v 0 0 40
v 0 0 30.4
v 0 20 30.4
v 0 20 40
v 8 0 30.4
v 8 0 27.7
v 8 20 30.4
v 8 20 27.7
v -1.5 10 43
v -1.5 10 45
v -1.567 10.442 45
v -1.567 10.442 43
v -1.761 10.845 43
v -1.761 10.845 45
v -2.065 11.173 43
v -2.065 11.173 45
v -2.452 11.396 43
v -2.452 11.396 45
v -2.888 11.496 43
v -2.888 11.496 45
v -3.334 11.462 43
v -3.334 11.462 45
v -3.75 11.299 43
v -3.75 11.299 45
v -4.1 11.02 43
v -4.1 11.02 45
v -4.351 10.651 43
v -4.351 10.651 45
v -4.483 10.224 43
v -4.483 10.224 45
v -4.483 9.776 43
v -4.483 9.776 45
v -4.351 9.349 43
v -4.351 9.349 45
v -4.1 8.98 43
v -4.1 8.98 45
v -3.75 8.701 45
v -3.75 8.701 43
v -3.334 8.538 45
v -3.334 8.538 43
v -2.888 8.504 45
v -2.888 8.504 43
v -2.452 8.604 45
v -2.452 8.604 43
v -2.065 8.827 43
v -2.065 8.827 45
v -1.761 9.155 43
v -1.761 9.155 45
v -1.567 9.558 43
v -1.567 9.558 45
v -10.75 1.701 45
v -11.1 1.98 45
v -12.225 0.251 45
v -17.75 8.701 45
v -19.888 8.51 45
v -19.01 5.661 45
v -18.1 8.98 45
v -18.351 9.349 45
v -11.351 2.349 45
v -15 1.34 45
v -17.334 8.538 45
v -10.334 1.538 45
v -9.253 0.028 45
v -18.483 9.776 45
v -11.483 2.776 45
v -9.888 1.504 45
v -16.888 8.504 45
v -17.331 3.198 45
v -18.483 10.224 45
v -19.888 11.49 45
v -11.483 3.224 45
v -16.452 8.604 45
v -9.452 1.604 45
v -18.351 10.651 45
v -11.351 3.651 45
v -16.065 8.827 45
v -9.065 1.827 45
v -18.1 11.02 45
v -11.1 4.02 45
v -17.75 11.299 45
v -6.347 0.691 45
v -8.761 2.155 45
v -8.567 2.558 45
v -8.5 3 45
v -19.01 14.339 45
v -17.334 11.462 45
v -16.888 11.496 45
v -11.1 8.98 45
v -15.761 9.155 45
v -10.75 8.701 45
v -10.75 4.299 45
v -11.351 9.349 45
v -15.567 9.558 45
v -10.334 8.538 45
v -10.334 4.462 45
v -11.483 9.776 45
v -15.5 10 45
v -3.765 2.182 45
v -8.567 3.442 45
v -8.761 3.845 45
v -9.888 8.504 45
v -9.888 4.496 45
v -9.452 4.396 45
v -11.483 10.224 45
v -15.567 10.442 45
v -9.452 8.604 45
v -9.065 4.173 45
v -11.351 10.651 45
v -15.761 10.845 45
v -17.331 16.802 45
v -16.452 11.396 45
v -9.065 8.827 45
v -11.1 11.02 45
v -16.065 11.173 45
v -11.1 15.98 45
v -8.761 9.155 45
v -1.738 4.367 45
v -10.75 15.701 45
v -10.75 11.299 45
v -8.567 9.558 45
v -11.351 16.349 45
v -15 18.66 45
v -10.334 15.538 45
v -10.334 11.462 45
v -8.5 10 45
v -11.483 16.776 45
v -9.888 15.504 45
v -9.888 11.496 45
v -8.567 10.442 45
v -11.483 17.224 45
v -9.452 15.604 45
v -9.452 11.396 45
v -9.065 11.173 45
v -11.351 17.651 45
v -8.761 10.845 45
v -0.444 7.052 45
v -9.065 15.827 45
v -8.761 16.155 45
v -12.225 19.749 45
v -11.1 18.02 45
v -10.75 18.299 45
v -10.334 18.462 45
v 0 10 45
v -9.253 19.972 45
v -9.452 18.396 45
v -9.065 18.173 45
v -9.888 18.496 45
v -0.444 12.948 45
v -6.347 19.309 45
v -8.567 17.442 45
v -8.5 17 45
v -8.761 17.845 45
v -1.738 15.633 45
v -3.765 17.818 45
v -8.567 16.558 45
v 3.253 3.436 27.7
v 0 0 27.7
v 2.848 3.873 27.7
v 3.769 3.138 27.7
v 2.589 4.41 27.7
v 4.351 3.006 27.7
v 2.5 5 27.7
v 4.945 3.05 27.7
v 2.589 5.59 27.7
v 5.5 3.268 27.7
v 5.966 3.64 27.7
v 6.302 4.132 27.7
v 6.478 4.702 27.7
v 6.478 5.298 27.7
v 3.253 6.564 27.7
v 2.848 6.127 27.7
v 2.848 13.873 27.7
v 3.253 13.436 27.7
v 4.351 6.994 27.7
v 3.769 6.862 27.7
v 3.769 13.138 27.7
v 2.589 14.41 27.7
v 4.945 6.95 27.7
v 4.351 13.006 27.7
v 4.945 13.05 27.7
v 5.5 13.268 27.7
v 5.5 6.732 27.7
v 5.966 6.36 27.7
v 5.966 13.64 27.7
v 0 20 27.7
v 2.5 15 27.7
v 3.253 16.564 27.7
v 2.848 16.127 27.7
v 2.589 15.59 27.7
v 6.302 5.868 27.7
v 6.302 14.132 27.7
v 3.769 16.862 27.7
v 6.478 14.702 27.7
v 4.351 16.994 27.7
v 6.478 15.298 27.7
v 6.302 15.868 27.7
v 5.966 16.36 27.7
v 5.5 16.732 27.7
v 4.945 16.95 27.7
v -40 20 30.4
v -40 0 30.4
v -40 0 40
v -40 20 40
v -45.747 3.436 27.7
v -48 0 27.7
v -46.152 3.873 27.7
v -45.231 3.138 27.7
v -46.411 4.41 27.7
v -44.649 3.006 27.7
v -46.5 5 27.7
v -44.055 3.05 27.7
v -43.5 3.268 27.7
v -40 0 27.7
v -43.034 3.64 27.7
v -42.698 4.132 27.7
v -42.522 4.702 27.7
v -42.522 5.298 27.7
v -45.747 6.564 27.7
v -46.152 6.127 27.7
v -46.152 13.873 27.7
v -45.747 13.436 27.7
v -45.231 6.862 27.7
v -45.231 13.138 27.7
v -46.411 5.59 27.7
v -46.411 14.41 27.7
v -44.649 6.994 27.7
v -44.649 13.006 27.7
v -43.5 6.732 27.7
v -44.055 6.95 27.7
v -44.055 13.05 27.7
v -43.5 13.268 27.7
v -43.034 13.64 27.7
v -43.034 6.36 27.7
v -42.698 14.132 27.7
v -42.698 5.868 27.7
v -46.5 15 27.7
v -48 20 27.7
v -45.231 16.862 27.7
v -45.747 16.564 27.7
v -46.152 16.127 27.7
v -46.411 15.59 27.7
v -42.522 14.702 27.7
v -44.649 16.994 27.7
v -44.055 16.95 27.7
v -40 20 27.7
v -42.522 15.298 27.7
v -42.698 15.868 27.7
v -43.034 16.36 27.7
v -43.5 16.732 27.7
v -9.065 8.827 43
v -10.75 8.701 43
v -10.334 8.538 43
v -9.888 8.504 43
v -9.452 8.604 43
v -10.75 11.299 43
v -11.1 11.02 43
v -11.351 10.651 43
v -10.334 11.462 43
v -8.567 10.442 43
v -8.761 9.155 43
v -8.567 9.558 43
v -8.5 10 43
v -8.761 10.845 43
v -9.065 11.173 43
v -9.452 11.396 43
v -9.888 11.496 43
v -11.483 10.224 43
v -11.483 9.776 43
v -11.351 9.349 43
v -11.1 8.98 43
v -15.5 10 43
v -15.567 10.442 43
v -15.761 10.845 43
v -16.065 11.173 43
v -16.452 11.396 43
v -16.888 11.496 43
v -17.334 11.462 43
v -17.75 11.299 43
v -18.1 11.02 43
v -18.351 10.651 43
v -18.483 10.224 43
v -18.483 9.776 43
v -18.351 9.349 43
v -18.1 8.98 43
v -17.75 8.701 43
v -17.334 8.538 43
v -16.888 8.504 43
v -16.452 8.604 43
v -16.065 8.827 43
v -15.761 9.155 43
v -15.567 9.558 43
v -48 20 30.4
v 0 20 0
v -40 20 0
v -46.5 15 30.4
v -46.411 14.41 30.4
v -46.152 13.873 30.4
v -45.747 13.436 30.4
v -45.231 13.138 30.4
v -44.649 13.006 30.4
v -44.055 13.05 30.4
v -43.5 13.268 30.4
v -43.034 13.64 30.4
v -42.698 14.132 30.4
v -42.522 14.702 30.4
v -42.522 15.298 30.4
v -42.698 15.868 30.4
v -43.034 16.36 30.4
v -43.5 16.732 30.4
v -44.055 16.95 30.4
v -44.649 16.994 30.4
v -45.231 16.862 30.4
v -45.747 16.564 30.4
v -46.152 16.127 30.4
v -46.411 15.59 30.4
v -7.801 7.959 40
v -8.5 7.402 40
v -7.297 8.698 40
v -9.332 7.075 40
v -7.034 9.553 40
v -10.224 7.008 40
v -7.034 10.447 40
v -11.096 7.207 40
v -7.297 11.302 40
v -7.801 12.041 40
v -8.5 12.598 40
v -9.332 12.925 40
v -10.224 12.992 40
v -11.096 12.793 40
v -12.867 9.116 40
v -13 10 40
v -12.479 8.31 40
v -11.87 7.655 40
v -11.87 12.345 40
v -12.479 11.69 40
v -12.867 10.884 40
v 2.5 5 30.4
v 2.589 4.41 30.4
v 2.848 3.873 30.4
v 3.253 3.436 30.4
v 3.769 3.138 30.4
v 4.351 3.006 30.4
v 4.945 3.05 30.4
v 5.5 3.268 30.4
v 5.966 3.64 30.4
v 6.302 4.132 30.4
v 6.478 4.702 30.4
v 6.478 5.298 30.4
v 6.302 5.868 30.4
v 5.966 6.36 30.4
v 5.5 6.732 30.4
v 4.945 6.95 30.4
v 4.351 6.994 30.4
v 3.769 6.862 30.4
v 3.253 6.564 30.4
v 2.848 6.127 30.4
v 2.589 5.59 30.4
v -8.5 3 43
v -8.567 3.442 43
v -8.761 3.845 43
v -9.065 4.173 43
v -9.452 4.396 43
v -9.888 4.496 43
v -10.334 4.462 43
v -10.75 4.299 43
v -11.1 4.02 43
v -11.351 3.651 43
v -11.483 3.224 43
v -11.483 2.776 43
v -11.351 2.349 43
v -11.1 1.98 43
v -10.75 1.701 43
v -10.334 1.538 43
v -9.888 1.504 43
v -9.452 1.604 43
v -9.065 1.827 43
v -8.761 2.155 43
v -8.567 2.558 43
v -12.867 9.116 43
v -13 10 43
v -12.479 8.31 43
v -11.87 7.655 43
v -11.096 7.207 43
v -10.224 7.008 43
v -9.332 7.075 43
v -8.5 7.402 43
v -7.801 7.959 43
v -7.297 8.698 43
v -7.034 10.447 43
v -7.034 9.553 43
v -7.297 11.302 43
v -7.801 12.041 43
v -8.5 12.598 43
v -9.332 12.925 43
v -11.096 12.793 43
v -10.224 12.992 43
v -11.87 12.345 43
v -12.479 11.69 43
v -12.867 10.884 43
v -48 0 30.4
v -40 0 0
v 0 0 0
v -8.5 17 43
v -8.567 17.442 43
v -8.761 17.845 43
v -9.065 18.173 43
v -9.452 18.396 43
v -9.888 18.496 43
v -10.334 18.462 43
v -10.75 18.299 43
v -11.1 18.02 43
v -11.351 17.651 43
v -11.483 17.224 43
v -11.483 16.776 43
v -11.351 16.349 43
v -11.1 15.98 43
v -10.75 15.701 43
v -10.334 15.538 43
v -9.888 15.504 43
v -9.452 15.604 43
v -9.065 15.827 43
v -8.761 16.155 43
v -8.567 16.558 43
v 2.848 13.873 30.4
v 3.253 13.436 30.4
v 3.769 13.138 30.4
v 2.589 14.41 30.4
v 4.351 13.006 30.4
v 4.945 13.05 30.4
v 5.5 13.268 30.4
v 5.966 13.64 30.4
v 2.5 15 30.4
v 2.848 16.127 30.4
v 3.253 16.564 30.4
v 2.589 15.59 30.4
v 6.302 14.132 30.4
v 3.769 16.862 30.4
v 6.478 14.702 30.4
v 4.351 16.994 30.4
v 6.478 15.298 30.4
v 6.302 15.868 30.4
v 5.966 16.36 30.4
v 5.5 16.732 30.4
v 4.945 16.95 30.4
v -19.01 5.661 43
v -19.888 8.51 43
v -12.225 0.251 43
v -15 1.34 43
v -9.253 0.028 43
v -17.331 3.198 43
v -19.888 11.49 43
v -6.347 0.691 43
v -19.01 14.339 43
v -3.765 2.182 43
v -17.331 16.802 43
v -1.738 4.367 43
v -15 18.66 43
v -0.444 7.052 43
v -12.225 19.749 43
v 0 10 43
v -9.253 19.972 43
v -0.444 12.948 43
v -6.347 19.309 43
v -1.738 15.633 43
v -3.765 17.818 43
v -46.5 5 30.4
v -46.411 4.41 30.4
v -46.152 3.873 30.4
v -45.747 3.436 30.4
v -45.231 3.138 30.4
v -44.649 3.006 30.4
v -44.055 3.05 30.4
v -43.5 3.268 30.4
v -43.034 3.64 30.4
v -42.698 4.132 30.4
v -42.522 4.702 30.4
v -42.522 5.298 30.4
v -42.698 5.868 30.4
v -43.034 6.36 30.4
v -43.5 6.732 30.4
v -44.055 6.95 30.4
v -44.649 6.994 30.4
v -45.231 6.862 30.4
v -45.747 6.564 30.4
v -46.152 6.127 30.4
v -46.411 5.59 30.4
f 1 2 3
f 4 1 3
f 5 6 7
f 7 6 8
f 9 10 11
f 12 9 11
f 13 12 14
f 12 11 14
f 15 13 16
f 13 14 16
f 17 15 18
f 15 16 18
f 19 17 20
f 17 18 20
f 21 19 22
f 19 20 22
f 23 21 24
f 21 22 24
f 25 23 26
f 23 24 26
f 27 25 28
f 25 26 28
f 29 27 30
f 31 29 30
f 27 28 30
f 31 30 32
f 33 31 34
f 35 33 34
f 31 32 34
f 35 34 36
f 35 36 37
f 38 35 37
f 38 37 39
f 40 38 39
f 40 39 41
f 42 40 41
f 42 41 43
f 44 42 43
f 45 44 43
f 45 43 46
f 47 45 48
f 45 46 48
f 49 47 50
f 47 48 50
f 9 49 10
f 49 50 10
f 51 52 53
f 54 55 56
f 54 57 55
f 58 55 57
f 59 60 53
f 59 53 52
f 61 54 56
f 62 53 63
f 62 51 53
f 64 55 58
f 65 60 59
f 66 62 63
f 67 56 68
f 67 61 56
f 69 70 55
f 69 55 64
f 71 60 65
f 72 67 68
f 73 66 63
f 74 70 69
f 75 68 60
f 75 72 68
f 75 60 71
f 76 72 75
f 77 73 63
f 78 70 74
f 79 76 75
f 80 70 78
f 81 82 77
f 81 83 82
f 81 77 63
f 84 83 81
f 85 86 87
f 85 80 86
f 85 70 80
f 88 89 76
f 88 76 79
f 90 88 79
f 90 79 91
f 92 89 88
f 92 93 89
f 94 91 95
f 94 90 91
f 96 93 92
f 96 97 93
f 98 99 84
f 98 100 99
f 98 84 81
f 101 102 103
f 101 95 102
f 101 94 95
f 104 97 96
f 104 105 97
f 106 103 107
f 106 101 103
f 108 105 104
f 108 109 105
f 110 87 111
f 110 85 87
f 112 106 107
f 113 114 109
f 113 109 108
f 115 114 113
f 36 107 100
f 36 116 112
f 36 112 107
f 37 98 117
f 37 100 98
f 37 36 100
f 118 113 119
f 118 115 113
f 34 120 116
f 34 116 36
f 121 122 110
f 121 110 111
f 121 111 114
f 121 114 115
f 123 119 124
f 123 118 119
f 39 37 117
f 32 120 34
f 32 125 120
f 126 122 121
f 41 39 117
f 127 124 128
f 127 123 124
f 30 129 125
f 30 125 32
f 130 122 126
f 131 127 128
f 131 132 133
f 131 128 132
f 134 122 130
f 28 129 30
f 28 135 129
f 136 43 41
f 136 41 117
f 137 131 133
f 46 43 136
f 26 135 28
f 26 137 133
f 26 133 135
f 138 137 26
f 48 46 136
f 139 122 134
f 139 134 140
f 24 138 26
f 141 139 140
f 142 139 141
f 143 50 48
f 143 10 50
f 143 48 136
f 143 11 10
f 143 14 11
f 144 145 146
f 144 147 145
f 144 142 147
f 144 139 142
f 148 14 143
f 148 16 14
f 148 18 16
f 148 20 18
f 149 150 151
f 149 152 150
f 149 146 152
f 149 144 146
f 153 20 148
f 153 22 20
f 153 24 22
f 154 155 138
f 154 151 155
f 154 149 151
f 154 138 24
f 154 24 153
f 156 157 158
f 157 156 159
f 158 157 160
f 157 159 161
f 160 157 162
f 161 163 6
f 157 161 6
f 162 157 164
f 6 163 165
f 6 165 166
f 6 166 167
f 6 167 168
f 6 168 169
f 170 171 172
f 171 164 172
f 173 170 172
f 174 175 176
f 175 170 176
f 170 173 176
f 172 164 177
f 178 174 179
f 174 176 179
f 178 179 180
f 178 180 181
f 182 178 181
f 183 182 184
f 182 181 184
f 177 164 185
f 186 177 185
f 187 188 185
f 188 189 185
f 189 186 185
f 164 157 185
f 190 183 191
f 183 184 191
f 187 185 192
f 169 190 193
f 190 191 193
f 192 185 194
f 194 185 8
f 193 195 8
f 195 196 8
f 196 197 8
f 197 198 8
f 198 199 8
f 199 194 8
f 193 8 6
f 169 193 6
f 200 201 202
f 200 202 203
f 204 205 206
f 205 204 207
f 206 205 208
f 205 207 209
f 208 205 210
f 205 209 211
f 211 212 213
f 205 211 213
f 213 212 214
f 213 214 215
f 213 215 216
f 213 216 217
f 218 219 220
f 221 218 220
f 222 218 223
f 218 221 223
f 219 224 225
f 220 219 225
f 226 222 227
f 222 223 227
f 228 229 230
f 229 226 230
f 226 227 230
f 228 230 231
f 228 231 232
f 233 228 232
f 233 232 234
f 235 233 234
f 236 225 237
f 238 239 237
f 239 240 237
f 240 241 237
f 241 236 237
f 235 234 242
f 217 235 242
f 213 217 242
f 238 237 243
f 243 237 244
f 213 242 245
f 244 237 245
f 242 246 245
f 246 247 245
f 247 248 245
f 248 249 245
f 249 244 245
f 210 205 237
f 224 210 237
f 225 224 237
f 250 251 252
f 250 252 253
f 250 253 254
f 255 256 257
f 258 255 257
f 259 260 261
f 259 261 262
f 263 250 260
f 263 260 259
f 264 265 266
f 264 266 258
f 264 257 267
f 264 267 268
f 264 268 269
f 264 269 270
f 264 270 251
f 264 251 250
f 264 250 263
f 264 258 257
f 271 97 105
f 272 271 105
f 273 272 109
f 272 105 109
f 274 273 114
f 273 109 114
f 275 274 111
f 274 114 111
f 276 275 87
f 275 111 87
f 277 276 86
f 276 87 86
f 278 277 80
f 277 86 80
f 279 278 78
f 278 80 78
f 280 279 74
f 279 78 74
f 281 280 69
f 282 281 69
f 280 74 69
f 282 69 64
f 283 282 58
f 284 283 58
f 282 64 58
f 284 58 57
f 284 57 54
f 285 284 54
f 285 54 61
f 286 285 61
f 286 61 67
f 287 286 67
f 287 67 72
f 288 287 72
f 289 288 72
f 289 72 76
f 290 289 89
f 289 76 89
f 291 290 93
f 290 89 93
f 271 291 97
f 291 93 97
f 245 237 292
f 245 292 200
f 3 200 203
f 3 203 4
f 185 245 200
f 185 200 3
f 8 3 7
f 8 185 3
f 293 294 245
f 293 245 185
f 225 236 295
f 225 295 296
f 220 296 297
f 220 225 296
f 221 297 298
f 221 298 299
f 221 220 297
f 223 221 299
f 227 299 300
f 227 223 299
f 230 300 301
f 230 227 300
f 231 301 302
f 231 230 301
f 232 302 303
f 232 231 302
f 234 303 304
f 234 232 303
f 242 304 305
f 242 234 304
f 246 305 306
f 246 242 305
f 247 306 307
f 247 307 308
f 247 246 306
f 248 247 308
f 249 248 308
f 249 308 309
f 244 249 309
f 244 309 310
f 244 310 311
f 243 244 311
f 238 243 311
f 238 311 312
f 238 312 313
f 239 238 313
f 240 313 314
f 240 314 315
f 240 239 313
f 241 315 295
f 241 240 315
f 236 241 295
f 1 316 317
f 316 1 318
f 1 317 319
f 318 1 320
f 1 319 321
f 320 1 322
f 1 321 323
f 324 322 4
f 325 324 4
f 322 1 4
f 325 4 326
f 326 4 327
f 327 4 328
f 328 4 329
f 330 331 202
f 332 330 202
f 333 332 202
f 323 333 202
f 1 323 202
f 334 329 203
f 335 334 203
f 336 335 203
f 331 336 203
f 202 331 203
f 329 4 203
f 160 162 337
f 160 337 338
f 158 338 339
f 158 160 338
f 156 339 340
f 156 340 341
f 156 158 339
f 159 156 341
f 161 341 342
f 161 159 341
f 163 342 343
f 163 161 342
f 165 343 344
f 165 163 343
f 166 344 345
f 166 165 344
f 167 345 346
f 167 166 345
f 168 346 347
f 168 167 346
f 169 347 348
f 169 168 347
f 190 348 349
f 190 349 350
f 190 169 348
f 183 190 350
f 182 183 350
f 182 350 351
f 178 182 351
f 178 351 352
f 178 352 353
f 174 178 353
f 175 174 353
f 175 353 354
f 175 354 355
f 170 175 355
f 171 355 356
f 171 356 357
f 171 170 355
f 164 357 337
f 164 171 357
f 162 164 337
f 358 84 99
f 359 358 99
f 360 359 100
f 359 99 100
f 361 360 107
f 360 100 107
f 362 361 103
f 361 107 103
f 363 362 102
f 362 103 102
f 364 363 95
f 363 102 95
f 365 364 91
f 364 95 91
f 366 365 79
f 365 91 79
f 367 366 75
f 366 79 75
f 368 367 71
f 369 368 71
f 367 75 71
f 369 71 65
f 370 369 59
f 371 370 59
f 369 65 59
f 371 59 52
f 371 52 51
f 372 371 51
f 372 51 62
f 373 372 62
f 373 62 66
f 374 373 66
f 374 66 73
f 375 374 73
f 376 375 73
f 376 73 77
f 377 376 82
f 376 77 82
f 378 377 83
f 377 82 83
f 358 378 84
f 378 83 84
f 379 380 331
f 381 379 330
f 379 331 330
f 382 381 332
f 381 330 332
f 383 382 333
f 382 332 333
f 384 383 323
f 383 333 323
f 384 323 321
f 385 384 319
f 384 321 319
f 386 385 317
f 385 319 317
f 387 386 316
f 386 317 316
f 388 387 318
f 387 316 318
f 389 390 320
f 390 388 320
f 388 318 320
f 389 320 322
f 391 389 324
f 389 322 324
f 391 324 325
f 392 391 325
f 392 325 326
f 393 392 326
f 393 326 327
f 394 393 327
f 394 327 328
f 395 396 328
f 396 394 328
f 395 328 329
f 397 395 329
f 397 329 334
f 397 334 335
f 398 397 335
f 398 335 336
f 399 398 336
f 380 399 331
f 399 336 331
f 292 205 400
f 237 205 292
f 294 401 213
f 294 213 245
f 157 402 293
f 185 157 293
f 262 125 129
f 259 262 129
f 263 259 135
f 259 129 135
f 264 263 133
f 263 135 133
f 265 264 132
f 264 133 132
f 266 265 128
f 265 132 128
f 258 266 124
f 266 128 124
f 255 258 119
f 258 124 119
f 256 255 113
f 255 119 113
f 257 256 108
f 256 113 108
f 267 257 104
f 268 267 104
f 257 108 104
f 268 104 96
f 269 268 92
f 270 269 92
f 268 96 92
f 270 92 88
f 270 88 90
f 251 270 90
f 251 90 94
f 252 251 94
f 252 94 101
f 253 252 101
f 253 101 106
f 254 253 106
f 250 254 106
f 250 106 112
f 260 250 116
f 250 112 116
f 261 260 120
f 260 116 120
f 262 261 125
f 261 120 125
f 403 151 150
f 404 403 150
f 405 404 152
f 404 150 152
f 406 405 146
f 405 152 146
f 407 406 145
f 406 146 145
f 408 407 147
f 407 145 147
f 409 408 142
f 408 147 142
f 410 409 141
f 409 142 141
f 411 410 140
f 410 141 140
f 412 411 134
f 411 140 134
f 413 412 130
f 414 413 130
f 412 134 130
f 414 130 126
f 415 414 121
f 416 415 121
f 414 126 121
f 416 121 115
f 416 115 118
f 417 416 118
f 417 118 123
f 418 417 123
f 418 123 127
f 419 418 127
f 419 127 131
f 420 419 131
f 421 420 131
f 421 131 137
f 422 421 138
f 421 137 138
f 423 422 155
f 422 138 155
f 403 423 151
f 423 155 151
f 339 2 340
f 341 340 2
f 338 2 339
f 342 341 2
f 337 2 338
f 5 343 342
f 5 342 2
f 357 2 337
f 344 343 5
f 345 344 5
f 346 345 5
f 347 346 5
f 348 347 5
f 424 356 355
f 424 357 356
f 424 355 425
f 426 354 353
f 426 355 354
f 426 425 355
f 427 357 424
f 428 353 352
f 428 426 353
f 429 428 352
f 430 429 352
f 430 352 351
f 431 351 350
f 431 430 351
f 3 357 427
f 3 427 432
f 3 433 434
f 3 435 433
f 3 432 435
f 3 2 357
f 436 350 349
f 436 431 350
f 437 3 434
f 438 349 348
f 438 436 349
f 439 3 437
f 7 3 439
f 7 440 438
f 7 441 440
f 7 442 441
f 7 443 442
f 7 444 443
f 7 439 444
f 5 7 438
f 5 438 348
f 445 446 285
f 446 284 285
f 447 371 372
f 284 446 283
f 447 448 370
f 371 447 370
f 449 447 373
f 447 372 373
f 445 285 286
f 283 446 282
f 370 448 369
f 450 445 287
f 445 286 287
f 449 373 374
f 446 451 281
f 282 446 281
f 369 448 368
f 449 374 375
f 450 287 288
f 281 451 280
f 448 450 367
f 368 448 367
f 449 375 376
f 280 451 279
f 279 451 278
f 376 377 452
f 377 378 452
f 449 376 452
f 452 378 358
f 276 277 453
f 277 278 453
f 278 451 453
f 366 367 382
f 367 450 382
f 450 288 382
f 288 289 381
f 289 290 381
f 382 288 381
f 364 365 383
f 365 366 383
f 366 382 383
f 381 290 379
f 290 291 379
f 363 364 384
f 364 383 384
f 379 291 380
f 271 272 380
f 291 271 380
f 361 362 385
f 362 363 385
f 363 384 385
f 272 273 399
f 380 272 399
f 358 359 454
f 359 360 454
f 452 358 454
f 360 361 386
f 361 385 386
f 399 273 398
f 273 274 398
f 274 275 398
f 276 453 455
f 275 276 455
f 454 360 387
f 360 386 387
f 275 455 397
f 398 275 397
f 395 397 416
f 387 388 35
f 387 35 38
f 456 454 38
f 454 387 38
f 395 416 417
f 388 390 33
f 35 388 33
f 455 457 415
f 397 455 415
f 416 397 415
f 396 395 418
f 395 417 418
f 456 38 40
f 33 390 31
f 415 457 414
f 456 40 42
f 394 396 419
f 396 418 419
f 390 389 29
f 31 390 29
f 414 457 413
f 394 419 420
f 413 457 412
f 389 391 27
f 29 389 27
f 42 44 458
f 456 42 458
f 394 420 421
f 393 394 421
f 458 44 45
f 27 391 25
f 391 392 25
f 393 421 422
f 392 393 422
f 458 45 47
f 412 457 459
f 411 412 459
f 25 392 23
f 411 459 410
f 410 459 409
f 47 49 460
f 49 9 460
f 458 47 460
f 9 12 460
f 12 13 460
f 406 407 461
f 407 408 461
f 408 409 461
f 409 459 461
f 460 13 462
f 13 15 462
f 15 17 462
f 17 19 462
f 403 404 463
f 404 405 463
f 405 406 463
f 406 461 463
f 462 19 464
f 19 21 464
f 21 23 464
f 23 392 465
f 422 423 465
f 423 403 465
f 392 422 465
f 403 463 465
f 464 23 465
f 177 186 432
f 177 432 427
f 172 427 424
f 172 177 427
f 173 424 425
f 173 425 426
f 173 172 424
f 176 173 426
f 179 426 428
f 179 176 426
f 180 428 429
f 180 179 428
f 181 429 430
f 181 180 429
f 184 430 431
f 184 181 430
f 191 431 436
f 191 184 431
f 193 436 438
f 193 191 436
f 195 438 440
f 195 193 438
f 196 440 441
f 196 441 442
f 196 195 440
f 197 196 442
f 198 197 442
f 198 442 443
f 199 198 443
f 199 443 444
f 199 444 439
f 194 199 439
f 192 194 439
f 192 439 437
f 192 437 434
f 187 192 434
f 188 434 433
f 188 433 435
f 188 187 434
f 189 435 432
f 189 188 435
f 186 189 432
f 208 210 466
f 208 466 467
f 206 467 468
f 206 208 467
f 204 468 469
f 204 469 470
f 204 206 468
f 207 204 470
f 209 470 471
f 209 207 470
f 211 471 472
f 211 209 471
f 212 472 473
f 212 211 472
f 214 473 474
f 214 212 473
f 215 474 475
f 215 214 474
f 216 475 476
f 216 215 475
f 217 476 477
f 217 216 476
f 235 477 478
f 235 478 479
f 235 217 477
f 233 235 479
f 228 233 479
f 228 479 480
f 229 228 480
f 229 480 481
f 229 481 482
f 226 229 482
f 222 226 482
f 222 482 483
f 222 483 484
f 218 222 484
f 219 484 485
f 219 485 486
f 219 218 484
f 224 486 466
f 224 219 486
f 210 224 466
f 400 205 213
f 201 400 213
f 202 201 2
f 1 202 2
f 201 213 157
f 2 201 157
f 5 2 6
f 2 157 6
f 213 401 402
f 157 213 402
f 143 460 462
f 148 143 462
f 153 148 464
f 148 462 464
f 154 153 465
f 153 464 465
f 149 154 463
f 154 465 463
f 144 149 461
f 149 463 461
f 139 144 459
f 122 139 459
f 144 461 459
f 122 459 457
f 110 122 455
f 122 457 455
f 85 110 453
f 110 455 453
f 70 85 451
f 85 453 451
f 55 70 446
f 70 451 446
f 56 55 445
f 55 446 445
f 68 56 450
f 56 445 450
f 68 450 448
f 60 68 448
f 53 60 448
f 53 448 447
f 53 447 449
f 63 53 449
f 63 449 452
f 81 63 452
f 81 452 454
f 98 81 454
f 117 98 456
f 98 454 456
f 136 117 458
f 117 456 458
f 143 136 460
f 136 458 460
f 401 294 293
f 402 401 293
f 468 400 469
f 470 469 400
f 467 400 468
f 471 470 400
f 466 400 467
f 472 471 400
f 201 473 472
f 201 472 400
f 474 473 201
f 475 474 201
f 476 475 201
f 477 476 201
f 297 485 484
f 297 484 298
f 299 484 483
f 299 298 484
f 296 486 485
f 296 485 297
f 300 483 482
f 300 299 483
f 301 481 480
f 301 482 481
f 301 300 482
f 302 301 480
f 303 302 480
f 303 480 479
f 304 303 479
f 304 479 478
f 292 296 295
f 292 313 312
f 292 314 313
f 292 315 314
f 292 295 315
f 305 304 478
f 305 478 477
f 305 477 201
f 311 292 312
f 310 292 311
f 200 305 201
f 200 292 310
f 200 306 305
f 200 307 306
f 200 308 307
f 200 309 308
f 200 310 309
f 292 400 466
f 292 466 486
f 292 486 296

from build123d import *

# Parameters (mm, degrees)
SKETCH_1_W           = 40
SKETCH_1_H           = 20
EXTRUDE_1_DEPTH      = 27.7
SKETCH_2_W           = 56
SKETCH_2_H           = 20
SKETCH_2_R           = 2
EXTRUDE_2_DEPTH      = 2.7
SKETCH_5_W           = 40
SKETCH_5_H           = 20
EXTRUDE_3_DEPTH      = 40
SKETCH_6_R           = 3
EXTRUDE_4_DEPTH      = 4.5
EXTRUDE_5_DEPTH      = 0.5
EXTRUDE_5_DEPTH_BACK = 1.5
SKETCH_7_R           = 10
SKETCH_8_R           = 1.5
CUT_EXTRUDE_4_DEPTH  = 2


with BuildPart() as part:
    # 草图1 → 凸台-拉伸1 (new body)
    with BuildSketch(Plane.XY):
        with Locations((-20, 10)):
            Rectangle(SKETCH_1_W, SKETCH_1_H)
    extrude(amount=EXTRUDE_1_DEPTH)

    # 草图2 → 凸台-拉伸2 (add)
    with BuildSketch(Plane.XY.offset(27.7)):
        with Locations((-20, 10)):
            Rectangle(SKETCH_2_W, SKETCH_2_H)
        with Locations(Location((-44.5, 15, 0), (0, 0, 180))):
            Circle(SKETCH_2_R, mode=Mode.SUBTRACT)
        with Locations(Location((-44.5, 5, 0), (0, 0, 180))):
            Circle(SKETCH_2_R, mode=Mode.SUBTRACT)
        with Locations(Location((4.5, 15, 0), (0, 0, 180))):
            Circle(SKETCH_2_R, mode=Mode.SUBTRACT)
        with Locations(Location((4.5, 5, 0), (0, 0, 180))):
            Circle(SKETCH_2_R, mode=Mode.SUBTRACT)
    extrude(amount=EXTRUDE_2_DEPTH)

    # 草图5 → 凸台-拉伸3 (add)
    with BuildSketch(Plane(origin=(0, 0, 0), x_dir=(-1, 0, 0), z_dir=(0, 0, -1))):
        with Locations((20, 10)):
            Rectangle(SKETCH_5_W, SKETCH_5_H)
    extrude(amount=-EXTRUDE_3_DEPTH)

    # 草图6 → 凸台-拉伸4 (add)
    with BuildSketch(Plane.XY.offset(40)):
        with Locations(Location((-10, 10, 0), (0, 0, 180))):
            Circle(SKETCH_6_R)
    extrude(amount=EXTRUDE_4_DEPTH)

    # 草图7 → 凸台-拉伸5 (add, two sides: drawn at the far end of the back side and taken through both)
    with BuildSketch(Plane.XY.offset(44.5).offset(-EXTRUDE_5_DEPTH_BACK)):
        with Locations((-10, 10)):
            Circle(SKETCH_7_R)
    extrude(amount=EXTRUDE_5_DEPTH + EXTRUDE_5_DEPTH_BACK)

    # 草图8 → 切除-拉伸4 (cut)
    with BuildSketch(Plane.XY.offset(45)):
        with Locations((-10, 10)):
            Circle(SKETCH_8_R)
        with Locations((-3, 10)):
            Circle(SKETCH_8_R)
        with Locations((-10, 17)):
            Circle(SKETCH_8_R)
        with Locations((-10, 3)):
            Circle(SKETCH_8_R)
        with Locations((-17, 10)):
            Circle(SKETCH_8_R)
    extrude(amount=-CUT_EXTRUDE_4_DEPTH, mode=Mode.SUBTRACT)


solid = part.part
